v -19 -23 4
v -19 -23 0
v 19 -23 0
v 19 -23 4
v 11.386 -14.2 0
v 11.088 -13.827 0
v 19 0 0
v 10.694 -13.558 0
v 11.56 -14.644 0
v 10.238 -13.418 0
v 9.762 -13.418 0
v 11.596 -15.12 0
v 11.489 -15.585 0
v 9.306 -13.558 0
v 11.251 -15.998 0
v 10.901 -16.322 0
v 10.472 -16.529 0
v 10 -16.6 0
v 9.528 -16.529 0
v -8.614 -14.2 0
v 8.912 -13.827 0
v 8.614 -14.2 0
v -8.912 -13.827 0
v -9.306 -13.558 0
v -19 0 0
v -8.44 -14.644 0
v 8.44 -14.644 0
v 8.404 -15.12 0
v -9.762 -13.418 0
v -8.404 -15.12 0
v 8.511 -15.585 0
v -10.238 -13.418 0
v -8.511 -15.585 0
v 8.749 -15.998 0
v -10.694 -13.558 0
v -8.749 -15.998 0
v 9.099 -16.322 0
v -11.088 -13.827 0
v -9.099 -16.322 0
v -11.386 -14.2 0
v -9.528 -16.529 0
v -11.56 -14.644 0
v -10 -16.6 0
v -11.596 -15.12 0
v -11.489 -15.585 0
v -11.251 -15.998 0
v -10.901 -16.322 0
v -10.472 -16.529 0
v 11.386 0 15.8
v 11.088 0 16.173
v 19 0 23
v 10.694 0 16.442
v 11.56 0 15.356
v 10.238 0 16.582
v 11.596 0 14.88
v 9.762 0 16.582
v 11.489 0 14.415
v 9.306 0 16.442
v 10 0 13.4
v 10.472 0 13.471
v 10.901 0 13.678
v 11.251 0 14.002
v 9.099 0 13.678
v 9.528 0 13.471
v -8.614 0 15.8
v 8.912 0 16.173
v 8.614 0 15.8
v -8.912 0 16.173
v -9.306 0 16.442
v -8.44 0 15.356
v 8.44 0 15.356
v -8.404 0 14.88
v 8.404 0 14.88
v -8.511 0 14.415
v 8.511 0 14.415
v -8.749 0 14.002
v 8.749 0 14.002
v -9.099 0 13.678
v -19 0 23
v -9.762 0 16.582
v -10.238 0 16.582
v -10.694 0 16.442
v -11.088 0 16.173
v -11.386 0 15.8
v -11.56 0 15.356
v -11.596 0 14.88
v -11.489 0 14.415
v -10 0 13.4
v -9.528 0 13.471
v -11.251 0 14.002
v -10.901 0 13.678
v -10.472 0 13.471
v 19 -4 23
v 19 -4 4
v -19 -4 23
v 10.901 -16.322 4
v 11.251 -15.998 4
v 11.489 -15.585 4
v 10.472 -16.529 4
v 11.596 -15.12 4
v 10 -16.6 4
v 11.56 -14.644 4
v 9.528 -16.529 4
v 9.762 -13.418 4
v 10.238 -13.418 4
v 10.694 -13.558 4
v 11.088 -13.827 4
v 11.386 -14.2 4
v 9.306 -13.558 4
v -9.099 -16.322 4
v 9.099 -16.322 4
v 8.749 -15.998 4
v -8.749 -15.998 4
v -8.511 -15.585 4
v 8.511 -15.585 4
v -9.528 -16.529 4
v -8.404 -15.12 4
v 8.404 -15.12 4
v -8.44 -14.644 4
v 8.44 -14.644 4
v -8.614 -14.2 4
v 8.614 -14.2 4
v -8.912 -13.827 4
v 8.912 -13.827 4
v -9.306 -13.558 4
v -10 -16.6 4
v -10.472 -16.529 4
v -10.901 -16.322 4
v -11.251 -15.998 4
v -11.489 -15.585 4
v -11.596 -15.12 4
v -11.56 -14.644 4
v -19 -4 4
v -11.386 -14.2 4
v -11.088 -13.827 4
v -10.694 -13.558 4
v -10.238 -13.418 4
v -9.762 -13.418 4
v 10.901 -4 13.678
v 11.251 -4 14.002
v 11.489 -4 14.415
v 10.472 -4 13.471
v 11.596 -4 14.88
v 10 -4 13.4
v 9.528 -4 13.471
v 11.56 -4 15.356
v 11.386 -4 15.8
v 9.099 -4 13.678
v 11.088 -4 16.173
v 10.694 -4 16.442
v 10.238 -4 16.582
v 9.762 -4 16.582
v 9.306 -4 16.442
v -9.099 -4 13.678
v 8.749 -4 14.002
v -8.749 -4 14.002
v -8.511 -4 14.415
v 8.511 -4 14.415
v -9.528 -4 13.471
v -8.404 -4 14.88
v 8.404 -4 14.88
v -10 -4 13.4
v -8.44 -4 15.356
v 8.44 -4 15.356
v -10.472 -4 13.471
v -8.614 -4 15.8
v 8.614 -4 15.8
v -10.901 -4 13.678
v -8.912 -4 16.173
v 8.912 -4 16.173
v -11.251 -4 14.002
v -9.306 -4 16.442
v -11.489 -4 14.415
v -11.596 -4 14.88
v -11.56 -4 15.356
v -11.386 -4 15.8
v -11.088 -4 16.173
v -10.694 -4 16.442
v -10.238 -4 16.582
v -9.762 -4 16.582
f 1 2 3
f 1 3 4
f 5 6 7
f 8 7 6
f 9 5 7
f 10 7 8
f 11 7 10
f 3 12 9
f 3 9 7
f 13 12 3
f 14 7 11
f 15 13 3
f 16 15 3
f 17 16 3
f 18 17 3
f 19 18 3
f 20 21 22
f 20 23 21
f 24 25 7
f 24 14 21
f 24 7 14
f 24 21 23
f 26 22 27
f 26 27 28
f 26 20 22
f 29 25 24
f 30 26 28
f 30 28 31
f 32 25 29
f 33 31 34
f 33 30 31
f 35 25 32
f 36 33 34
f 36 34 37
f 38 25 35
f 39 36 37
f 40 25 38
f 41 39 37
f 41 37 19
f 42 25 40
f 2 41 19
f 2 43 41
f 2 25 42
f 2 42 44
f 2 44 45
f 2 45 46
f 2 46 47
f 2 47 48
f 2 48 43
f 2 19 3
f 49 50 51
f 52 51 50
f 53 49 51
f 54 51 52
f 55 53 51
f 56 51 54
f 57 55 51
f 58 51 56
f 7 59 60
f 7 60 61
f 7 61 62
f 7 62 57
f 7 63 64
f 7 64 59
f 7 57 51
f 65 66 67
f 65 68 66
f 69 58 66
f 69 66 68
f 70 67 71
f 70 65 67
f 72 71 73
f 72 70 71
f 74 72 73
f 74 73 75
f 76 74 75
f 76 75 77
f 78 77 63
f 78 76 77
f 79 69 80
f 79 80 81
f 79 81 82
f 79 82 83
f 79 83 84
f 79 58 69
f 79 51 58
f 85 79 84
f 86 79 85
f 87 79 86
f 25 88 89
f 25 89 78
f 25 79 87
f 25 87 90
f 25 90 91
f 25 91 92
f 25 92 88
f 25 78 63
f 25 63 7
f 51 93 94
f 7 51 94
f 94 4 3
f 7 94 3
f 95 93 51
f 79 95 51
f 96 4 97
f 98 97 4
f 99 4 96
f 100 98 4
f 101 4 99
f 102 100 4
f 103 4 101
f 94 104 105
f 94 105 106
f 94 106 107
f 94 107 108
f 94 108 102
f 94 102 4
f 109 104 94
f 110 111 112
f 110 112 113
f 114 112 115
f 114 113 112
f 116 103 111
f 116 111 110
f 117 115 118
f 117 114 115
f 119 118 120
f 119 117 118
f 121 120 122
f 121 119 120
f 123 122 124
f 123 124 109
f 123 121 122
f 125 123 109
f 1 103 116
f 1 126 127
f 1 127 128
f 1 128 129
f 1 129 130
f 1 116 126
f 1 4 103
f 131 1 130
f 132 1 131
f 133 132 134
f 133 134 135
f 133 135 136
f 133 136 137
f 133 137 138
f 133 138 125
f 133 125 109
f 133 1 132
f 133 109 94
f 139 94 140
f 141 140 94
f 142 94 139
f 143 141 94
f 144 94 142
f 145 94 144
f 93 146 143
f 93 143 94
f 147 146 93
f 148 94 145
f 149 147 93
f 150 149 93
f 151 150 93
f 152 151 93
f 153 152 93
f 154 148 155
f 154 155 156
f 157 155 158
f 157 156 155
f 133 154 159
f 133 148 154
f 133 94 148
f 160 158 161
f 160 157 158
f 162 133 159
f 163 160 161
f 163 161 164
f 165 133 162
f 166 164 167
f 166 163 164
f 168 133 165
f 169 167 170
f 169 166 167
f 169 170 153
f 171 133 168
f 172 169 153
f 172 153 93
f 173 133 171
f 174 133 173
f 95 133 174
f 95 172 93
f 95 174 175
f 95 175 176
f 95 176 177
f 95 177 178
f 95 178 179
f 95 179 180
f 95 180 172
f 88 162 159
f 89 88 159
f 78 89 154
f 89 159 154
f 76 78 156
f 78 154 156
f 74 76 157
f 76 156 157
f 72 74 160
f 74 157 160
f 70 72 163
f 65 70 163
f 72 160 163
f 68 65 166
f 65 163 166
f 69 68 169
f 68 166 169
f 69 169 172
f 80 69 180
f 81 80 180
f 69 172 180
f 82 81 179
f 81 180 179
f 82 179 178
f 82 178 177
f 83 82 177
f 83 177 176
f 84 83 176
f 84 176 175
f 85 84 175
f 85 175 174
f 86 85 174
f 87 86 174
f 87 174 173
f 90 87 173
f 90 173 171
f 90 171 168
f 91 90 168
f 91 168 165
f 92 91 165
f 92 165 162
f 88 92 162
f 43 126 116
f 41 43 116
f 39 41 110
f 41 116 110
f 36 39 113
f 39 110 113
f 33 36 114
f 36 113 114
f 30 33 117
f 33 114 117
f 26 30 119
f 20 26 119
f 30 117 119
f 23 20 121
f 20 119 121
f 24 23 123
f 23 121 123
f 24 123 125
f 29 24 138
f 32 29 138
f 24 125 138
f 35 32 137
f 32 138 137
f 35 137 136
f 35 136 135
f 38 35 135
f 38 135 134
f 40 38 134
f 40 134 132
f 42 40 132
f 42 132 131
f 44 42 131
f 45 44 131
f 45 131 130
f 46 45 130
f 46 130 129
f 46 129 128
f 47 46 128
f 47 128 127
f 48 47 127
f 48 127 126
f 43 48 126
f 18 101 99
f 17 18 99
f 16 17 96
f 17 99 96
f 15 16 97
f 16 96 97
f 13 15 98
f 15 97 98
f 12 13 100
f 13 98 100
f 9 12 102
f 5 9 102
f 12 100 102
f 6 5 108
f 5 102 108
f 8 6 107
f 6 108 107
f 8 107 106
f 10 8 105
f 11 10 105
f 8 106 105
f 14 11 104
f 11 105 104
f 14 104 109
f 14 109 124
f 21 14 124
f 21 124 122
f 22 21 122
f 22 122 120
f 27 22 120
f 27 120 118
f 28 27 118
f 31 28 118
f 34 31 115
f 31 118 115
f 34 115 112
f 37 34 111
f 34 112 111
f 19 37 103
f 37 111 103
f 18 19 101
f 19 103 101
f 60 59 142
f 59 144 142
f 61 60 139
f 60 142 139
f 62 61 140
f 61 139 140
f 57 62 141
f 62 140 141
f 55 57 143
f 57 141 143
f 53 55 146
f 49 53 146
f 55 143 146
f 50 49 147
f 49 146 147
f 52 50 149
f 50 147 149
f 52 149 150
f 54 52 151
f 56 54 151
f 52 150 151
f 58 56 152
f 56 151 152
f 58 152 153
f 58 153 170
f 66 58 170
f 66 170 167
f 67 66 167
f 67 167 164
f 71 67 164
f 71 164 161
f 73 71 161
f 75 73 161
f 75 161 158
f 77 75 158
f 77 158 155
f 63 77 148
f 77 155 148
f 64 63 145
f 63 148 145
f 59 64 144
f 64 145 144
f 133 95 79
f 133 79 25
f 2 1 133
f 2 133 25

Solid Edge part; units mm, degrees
sketch "Sketch1" plane through (0, 0, 0) normal (1, 0, 0) x (0, 1, 0)
  line L0 (-4, 4) -> (-4, 23)
  line L1 (-4, 23) -> (0, 23)
  line L2 (0, 23) -> (0, 0)
  line L3 (0, 0) -> (-23, 0)
  line L4 (-23, 0) -> (-23, 4)
  line L5 (-23, 4) -> (-4, 4)
extrude "Protrusion1" add sketch "Sketch1" along normal mid plane 38
hole "Agujero_1" at (10, -4, 15) direction (0, 1, 0) diameter 3.2 end up to next
hole "Hole1" at (-10, -4, 15) direction (0, 1, 0) diameter 3.2 end up to next
hole "Agujero_3" at (10, -15, 4) direction (0, 0, -1) diameter 3.2 end up to next
hole "Hole2" at (-10, -15, 4) direction (0, 0, -1) diameter 3.2 end up to next
